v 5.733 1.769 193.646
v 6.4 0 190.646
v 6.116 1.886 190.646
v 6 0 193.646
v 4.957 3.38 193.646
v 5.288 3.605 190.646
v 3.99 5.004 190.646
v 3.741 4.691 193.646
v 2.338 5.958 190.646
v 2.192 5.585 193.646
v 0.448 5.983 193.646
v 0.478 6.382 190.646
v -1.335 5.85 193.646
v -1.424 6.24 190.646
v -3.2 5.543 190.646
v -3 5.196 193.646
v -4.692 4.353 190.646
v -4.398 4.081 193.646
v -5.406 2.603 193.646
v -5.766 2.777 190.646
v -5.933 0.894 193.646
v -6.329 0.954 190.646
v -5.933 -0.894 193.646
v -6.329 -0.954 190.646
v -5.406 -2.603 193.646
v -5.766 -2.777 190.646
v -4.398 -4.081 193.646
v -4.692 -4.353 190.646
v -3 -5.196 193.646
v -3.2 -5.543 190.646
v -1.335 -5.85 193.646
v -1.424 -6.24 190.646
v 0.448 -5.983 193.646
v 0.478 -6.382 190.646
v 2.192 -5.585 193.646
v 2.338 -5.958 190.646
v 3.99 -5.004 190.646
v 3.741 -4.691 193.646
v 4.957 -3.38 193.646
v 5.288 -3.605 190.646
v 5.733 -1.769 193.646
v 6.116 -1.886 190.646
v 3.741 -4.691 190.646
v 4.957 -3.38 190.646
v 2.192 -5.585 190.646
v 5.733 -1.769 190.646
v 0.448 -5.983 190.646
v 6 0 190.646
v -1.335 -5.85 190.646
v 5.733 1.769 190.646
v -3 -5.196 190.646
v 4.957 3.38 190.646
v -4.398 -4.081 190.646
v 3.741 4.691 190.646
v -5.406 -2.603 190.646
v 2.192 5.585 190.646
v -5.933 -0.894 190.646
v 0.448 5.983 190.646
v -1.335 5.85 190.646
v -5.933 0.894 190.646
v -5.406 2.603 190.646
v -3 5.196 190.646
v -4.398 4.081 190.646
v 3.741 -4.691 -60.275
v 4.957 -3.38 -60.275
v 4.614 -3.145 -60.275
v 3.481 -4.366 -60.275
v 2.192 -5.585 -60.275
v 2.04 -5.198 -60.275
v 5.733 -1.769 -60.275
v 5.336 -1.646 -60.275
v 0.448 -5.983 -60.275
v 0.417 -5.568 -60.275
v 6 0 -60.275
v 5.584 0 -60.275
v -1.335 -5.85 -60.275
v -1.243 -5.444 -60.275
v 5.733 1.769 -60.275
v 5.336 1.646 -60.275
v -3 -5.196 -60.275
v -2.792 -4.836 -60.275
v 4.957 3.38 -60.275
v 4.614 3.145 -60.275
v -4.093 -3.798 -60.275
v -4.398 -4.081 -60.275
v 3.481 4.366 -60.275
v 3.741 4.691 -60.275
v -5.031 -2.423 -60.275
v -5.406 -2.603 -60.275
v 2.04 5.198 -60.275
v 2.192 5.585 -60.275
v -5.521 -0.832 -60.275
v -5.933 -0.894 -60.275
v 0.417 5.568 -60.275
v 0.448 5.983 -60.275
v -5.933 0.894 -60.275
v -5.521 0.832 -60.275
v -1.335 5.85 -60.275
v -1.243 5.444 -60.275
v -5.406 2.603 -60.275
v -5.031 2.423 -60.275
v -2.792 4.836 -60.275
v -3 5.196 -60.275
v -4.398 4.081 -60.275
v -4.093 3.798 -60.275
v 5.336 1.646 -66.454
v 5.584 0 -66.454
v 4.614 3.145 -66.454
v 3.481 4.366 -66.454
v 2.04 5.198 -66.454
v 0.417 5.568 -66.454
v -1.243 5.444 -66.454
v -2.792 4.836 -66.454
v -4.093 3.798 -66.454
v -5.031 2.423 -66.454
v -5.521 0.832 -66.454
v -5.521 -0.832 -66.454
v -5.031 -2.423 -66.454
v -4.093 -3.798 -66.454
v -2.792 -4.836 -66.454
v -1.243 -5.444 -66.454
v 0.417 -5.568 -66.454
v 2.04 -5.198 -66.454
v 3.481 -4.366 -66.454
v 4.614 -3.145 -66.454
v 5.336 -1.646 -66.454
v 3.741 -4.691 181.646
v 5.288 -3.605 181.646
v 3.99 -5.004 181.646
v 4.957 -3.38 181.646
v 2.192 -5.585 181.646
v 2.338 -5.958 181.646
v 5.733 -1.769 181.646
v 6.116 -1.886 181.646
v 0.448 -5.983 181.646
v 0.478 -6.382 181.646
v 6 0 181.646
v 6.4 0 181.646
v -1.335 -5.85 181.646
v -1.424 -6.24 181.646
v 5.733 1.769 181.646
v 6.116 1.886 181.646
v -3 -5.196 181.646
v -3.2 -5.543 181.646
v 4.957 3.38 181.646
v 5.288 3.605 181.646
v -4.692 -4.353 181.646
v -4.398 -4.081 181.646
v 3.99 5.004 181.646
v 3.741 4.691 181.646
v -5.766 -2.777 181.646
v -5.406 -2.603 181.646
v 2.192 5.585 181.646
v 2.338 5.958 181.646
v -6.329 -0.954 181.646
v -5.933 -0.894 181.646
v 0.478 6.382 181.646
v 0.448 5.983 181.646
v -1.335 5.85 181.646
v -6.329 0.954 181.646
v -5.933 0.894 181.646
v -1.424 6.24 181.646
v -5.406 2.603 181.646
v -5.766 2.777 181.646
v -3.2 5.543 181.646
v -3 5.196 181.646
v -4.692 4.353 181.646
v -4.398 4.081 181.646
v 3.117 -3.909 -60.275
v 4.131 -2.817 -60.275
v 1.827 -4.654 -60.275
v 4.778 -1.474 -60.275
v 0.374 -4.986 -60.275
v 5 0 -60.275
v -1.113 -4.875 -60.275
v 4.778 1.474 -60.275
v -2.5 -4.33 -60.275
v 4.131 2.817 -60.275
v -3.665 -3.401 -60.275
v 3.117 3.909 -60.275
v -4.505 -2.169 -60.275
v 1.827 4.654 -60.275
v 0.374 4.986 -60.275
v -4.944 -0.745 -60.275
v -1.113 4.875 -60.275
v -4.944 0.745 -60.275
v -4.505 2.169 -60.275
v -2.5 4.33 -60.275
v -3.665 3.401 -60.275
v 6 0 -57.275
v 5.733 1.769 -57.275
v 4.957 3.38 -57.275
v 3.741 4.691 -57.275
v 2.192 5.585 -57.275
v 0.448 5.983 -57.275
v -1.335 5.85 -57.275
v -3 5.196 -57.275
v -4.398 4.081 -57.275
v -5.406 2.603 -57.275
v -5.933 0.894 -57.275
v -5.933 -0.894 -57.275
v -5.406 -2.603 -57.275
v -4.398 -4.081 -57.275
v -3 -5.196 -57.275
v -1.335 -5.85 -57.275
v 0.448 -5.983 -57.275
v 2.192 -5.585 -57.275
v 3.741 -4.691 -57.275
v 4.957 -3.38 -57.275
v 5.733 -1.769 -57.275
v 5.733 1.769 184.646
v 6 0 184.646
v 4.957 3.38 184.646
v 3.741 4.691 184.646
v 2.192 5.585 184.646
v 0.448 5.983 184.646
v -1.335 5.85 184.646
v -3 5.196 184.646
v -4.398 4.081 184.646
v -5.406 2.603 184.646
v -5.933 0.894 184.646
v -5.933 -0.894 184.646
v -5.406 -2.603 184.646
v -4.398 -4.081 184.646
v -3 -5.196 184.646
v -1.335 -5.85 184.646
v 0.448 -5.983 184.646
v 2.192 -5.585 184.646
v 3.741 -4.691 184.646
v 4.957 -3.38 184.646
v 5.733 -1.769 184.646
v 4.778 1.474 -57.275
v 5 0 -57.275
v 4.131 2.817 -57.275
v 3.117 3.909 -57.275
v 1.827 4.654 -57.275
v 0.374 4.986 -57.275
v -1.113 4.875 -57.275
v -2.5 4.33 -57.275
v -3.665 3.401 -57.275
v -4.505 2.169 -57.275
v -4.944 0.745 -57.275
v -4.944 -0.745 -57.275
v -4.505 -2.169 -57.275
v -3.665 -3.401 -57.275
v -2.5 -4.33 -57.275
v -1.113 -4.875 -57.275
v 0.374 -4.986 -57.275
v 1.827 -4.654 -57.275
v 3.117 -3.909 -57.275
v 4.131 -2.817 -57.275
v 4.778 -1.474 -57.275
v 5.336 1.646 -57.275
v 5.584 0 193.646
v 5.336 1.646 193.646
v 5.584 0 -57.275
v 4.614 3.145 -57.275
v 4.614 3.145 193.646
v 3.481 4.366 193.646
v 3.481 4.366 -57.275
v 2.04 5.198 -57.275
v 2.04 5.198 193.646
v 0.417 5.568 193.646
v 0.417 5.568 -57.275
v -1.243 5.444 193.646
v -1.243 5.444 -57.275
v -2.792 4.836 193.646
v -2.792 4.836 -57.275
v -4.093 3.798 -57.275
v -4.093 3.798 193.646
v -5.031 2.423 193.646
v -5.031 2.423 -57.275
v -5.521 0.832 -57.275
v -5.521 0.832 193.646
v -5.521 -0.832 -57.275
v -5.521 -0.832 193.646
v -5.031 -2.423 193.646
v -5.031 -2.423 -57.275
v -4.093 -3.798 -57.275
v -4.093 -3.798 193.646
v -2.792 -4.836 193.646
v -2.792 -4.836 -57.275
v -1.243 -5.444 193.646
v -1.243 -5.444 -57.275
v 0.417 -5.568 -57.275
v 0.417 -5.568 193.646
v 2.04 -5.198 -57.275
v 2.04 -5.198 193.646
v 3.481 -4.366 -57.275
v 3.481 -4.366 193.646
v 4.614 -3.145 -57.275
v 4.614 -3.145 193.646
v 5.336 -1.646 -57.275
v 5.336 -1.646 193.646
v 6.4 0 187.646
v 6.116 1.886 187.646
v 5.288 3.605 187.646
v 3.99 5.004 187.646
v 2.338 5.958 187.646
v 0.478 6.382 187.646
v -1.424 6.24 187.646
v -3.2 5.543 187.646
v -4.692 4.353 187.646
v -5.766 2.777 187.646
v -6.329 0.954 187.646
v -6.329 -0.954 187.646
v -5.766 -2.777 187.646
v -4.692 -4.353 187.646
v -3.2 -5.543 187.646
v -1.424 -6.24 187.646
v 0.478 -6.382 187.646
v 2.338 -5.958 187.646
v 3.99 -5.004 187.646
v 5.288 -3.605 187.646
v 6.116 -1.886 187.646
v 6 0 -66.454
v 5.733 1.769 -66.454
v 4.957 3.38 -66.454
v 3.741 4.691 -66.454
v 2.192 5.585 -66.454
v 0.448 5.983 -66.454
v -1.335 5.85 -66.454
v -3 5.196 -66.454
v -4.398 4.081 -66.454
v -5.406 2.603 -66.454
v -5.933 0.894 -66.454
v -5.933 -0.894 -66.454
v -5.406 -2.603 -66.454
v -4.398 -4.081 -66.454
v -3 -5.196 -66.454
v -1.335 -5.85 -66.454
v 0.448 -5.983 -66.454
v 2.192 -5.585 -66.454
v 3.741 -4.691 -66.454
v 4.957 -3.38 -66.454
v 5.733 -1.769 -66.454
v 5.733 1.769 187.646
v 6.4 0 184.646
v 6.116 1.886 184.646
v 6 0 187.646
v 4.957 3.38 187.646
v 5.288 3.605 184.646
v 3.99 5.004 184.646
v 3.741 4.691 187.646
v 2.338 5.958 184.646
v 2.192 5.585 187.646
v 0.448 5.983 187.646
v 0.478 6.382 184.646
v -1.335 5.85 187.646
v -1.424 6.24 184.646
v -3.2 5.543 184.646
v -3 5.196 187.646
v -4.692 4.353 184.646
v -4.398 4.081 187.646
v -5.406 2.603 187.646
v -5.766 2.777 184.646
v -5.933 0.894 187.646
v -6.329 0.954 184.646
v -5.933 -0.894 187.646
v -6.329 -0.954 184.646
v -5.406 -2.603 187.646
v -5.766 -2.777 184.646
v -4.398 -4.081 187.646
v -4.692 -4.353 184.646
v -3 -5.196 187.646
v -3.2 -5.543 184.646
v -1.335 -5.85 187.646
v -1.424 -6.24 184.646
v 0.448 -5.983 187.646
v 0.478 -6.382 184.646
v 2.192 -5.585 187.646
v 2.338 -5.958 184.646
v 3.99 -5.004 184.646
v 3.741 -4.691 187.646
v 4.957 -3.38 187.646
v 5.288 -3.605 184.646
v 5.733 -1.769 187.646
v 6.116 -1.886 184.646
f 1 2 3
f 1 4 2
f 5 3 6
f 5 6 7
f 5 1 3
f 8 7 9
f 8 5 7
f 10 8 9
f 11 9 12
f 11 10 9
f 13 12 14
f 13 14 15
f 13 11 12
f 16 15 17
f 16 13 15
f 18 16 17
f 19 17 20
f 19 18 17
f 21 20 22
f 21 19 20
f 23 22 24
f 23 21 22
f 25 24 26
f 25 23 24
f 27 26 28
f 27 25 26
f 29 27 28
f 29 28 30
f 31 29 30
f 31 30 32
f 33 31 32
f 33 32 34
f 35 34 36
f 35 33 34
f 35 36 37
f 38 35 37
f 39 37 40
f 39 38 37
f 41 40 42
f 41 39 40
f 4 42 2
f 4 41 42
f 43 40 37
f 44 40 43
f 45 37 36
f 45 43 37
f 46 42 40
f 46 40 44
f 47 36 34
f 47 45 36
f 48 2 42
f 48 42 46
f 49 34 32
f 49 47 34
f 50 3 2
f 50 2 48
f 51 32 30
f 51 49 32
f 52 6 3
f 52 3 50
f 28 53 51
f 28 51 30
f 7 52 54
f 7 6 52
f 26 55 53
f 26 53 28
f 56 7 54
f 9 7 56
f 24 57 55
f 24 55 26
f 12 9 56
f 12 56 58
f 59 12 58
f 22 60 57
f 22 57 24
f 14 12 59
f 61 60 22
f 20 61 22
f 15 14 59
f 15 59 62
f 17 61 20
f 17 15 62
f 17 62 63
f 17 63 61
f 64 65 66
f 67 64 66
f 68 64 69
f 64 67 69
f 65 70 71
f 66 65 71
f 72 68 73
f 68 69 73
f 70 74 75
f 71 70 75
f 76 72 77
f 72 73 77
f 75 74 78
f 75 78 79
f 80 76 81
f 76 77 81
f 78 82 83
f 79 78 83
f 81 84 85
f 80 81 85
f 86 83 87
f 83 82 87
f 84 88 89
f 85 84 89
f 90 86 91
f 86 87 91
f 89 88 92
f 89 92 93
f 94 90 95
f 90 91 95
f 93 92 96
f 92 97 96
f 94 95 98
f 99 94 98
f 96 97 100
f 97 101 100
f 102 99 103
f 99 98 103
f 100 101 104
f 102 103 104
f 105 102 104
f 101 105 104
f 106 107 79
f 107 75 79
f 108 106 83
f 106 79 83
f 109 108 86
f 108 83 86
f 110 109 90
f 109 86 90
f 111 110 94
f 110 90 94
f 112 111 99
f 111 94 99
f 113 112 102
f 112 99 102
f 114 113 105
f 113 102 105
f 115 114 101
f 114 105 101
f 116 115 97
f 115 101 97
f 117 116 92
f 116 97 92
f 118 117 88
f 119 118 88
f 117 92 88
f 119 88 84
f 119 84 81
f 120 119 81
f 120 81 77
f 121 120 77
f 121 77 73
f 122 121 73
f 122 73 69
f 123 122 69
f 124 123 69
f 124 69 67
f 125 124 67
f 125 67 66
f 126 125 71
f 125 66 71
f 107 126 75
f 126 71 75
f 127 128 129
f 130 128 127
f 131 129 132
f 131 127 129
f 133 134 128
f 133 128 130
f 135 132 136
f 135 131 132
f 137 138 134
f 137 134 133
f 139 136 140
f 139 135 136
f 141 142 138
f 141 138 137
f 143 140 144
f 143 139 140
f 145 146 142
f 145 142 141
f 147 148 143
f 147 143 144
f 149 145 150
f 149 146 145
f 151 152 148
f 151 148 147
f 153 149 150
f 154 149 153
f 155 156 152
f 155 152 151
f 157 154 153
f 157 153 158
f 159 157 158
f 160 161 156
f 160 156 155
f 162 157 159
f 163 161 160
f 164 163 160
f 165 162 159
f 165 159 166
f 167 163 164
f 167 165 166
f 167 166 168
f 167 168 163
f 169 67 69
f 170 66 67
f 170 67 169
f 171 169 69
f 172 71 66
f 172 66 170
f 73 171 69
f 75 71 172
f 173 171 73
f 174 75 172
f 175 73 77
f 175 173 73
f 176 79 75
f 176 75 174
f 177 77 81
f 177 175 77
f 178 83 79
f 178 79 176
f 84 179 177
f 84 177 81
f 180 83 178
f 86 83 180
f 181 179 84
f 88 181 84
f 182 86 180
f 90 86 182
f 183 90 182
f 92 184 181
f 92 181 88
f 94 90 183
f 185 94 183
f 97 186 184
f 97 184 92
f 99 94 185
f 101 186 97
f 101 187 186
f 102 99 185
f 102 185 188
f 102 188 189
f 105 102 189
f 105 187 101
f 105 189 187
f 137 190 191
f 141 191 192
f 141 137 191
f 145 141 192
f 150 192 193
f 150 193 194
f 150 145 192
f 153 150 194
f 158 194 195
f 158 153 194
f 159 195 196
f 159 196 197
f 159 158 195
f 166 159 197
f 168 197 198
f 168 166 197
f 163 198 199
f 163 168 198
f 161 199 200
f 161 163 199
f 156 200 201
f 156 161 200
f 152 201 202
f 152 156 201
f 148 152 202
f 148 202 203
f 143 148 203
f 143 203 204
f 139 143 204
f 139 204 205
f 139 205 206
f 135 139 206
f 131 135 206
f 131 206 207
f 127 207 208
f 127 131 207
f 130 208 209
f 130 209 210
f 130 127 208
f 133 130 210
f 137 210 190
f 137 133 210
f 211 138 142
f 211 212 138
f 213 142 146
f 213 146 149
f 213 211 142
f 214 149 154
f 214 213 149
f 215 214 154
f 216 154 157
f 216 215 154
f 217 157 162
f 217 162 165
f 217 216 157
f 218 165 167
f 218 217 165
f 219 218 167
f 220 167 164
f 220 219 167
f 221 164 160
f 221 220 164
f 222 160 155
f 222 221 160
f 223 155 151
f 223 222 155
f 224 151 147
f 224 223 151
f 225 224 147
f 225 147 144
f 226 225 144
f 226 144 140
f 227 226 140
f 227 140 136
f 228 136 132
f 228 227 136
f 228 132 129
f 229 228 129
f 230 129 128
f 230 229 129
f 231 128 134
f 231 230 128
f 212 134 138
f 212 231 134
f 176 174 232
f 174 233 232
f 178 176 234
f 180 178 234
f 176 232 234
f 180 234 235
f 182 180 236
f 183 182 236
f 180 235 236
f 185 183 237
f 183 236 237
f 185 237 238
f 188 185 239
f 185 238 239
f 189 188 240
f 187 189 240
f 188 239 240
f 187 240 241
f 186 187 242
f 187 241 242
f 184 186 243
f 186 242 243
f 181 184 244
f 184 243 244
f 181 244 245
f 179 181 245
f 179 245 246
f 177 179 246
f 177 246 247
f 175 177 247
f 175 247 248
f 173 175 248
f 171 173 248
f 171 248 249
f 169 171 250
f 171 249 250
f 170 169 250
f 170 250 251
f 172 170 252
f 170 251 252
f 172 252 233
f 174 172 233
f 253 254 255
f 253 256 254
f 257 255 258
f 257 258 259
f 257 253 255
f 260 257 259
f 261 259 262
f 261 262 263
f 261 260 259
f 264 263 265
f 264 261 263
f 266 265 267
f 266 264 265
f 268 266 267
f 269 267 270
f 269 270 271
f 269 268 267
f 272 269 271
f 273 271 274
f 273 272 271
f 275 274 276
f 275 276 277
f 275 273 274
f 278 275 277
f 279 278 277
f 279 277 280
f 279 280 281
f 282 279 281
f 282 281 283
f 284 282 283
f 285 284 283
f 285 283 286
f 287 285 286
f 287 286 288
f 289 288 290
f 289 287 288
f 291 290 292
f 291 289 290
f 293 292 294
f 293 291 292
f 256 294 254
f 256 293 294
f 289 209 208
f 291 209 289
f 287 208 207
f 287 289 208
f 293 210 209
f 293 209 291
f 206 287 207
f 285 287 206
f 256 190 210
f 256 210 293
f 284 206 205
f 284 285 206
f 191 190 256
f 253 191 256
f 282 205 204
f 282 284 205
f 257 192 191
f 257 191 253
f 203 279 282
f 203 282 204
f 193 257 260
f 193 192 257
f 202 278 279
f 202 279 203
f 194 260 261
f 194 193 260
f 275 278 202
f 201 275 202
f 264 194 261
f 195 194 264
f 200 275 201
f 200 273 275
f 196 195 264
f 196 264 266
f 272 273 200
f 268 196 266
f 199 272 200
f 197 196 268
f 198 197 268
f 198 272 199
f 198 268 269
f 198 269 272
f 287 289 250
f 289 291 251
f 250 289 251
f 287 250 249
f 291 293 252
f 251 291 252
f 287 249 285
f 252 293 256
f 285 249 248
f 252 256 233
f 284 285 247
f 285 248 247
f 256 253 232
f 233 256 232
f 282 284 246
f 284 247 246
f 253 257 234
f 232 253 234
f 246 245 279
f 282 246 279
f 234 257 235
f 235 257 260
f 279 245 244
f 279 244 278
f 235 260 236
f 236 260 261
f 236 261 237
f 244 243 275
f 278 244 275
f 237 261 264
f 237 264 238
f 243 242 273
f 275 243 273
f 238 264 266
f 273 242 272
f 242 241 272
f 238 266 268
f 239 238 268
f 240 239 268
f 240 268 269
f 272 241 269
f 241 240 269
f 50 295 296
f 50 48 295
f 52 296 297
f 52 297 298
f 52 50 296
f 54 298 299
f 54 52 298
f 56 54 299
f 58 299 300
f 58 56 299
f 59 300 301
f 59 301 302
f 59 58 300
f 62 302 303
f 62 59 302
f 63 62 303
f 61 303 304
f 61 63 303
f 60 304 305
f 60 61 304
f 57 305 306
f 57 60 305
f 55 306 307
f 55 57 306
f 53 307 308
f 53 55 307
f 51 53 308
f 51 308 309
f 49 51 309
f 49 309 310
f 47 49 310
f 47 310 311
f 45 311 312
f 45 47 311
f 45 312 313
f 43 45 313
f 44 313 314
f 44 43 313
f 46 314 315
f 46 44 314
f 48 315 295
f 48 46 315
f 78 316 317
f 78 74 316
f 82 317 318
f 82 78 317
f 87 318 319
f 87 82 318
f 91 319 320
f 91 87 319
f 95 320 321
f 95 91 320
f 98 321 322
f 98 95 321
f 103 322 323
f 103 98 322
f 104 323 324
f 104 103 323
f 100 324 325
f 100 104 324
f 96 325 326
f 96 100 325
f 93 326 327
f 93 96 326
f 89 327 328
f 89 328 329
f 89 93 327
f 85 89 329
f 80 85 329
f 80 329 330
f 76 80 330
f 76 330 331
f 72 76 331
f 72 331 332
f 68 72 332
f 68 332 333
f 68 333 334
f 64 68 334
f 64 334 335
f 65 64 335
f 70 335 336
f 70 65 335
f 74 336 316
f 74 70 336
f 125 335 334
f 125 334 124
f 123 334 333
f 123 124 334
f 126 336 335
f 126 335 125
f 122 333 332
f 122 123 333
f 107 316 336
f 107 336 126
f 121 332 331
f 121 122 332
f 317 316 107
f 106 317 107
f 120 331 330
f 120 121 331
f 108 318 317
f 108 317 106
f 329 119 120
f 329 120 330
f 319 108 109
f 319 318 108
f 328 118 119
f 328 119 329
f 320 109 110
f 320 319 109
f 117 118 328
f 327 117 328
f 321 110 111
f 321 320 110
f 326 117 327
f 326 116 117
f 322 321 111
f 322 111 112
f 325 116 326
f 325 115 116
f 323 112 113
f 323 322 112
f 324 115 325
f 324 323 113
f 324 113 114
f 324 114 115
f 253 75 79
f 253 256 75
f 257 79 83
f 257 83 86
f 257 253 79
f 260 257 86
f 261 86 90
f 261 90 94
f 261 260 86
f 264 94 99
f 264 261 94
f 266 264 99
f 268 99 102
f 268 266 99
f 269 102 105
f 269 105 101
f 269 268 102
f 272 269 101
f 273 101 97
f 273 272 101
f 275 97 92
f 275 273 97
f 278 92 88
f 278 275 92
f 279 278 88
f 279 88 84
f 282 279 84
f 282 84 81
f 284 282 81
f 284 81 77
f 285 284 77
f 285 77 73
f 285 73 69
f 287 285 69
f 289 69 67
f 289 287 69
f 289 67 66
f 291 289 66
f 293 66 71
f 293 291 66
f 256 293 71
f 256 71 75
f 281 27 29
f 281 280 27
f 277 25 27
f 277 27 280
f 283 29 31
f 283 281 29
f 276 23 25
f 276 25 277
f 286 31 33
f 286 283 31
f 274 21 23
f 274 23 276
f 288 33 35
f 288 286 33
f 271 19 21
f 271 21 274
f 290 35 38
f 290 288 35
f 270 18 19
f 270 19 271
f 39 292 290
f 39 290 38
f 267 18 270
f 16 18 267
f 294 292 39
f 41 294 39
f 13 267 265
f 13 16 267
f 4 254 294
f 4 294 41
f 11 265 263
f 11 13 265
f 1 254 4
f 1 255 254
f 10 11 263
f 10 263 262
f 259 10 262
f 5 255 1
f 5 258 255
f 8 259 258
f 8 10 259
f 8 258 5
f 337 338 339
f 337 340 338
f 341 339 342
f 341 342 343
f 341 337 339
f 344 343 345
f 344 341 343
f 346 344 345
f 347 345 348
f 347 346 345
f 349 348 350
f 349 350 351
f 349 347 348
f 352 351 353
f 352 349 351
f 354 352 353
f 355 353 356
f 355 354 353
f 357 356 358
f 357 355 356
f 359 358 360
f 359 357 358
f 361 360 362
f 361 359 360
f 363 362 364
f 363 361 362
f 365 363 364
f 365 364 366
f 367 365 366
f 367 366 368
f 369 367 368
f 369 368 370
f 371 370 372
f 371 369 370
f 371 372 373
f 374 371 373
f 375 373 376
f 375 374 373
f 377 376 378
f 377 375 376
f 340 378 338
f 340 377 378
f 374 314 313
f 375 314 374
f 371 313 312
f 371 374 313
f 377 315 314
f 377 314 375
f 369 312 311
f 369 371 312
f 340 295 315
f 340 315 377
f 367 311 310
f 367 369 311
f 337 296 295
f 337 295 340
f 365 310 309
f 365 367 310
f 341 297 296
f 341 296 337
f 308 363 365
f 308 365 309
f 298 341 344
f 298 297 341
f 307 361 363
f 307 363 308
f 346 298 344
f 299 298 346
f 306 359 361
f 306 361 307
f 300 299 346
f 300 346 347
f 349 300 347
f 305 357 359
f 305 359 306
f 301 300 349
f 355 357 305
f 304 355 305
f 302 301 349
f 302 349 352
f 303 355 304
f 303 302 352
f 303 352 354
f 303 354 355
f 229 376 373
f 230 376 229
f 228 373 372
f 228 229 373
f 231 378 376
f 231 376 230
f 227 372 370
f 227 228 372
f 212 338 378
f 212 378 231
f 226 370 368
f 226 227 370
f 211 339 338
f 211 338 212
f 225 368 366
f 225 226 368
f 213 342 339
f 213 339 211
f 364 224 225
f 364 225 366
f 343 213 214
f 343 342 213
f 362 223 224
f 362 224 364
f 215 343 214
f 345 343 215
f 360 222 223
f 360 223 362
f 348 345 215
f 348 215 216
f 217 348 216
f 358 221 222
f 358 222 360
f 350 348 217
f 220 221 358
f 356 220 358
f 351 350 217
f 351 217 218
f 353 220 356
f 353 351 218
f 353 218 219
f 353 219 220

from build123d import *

# Parameters (mm, degrees)
F0_W   = 0.4161982276
F0_H   = 6.1783934414
F0_W_2 = 0.5838017724
F0_H_2 = 3


with BuildPart() as f1:
    # F0 (on Front) → F1 (revolve)
    with BuildSketch(Plane.XZ):
        with Locations((5.7919008862, -63.3643986553)):
            Rectangle(F0_W, F0_H)
    revolve(axis=Axis((0, 0, 63.7747980654), (0, 0, 1)))


with BuildPart() as f1b:
    # F0 (on Front) → F1, piece 2 (revolve)
    with BuildSketch(Plane.XZ):
        Polygon((5.5838017724, 193.646404624), (5.5838017724, -57.2752019346), (6, -57.2752019346), (6, 181.646404624), (6, 184.646404624), (6, 187.646404624), (6, 190.646404624), (6, 193.646404624), align=None)
        Polygon((6, 184.646404624), (6, 181.646404624), (6.4, 181.646404624), align=None)
        Polygon((6.4, 190.646404624), (6, 193.646404624), (6, 190.646404624), align=None)
        Polygon((6, 187.646404624), (6, 184.646404624), (6.4, 184.646404624), align=None)
        Polygon((6.4, 187.646404624), (6, 190.646404624), (6, 187.646404624), align=None)
    revolve(axis=Axis((0, 0, 63.7747980654), (0, 0, 1)))


with BuildPart() as f1c:
    # F0 (on Front) → F1, piece 3 (revolve)
    with BuildSketch(Plane.XZ):
        with Locations((5.2919008862, -58.7752019346)):
            Rectangle(F0_W_2, F0_H_2)
    revolve(axis=Axis((0, 0, 63.7747980654), (0, 0, 1)))


solid = Compound([f1.part, f1b.part, f1c.part])
